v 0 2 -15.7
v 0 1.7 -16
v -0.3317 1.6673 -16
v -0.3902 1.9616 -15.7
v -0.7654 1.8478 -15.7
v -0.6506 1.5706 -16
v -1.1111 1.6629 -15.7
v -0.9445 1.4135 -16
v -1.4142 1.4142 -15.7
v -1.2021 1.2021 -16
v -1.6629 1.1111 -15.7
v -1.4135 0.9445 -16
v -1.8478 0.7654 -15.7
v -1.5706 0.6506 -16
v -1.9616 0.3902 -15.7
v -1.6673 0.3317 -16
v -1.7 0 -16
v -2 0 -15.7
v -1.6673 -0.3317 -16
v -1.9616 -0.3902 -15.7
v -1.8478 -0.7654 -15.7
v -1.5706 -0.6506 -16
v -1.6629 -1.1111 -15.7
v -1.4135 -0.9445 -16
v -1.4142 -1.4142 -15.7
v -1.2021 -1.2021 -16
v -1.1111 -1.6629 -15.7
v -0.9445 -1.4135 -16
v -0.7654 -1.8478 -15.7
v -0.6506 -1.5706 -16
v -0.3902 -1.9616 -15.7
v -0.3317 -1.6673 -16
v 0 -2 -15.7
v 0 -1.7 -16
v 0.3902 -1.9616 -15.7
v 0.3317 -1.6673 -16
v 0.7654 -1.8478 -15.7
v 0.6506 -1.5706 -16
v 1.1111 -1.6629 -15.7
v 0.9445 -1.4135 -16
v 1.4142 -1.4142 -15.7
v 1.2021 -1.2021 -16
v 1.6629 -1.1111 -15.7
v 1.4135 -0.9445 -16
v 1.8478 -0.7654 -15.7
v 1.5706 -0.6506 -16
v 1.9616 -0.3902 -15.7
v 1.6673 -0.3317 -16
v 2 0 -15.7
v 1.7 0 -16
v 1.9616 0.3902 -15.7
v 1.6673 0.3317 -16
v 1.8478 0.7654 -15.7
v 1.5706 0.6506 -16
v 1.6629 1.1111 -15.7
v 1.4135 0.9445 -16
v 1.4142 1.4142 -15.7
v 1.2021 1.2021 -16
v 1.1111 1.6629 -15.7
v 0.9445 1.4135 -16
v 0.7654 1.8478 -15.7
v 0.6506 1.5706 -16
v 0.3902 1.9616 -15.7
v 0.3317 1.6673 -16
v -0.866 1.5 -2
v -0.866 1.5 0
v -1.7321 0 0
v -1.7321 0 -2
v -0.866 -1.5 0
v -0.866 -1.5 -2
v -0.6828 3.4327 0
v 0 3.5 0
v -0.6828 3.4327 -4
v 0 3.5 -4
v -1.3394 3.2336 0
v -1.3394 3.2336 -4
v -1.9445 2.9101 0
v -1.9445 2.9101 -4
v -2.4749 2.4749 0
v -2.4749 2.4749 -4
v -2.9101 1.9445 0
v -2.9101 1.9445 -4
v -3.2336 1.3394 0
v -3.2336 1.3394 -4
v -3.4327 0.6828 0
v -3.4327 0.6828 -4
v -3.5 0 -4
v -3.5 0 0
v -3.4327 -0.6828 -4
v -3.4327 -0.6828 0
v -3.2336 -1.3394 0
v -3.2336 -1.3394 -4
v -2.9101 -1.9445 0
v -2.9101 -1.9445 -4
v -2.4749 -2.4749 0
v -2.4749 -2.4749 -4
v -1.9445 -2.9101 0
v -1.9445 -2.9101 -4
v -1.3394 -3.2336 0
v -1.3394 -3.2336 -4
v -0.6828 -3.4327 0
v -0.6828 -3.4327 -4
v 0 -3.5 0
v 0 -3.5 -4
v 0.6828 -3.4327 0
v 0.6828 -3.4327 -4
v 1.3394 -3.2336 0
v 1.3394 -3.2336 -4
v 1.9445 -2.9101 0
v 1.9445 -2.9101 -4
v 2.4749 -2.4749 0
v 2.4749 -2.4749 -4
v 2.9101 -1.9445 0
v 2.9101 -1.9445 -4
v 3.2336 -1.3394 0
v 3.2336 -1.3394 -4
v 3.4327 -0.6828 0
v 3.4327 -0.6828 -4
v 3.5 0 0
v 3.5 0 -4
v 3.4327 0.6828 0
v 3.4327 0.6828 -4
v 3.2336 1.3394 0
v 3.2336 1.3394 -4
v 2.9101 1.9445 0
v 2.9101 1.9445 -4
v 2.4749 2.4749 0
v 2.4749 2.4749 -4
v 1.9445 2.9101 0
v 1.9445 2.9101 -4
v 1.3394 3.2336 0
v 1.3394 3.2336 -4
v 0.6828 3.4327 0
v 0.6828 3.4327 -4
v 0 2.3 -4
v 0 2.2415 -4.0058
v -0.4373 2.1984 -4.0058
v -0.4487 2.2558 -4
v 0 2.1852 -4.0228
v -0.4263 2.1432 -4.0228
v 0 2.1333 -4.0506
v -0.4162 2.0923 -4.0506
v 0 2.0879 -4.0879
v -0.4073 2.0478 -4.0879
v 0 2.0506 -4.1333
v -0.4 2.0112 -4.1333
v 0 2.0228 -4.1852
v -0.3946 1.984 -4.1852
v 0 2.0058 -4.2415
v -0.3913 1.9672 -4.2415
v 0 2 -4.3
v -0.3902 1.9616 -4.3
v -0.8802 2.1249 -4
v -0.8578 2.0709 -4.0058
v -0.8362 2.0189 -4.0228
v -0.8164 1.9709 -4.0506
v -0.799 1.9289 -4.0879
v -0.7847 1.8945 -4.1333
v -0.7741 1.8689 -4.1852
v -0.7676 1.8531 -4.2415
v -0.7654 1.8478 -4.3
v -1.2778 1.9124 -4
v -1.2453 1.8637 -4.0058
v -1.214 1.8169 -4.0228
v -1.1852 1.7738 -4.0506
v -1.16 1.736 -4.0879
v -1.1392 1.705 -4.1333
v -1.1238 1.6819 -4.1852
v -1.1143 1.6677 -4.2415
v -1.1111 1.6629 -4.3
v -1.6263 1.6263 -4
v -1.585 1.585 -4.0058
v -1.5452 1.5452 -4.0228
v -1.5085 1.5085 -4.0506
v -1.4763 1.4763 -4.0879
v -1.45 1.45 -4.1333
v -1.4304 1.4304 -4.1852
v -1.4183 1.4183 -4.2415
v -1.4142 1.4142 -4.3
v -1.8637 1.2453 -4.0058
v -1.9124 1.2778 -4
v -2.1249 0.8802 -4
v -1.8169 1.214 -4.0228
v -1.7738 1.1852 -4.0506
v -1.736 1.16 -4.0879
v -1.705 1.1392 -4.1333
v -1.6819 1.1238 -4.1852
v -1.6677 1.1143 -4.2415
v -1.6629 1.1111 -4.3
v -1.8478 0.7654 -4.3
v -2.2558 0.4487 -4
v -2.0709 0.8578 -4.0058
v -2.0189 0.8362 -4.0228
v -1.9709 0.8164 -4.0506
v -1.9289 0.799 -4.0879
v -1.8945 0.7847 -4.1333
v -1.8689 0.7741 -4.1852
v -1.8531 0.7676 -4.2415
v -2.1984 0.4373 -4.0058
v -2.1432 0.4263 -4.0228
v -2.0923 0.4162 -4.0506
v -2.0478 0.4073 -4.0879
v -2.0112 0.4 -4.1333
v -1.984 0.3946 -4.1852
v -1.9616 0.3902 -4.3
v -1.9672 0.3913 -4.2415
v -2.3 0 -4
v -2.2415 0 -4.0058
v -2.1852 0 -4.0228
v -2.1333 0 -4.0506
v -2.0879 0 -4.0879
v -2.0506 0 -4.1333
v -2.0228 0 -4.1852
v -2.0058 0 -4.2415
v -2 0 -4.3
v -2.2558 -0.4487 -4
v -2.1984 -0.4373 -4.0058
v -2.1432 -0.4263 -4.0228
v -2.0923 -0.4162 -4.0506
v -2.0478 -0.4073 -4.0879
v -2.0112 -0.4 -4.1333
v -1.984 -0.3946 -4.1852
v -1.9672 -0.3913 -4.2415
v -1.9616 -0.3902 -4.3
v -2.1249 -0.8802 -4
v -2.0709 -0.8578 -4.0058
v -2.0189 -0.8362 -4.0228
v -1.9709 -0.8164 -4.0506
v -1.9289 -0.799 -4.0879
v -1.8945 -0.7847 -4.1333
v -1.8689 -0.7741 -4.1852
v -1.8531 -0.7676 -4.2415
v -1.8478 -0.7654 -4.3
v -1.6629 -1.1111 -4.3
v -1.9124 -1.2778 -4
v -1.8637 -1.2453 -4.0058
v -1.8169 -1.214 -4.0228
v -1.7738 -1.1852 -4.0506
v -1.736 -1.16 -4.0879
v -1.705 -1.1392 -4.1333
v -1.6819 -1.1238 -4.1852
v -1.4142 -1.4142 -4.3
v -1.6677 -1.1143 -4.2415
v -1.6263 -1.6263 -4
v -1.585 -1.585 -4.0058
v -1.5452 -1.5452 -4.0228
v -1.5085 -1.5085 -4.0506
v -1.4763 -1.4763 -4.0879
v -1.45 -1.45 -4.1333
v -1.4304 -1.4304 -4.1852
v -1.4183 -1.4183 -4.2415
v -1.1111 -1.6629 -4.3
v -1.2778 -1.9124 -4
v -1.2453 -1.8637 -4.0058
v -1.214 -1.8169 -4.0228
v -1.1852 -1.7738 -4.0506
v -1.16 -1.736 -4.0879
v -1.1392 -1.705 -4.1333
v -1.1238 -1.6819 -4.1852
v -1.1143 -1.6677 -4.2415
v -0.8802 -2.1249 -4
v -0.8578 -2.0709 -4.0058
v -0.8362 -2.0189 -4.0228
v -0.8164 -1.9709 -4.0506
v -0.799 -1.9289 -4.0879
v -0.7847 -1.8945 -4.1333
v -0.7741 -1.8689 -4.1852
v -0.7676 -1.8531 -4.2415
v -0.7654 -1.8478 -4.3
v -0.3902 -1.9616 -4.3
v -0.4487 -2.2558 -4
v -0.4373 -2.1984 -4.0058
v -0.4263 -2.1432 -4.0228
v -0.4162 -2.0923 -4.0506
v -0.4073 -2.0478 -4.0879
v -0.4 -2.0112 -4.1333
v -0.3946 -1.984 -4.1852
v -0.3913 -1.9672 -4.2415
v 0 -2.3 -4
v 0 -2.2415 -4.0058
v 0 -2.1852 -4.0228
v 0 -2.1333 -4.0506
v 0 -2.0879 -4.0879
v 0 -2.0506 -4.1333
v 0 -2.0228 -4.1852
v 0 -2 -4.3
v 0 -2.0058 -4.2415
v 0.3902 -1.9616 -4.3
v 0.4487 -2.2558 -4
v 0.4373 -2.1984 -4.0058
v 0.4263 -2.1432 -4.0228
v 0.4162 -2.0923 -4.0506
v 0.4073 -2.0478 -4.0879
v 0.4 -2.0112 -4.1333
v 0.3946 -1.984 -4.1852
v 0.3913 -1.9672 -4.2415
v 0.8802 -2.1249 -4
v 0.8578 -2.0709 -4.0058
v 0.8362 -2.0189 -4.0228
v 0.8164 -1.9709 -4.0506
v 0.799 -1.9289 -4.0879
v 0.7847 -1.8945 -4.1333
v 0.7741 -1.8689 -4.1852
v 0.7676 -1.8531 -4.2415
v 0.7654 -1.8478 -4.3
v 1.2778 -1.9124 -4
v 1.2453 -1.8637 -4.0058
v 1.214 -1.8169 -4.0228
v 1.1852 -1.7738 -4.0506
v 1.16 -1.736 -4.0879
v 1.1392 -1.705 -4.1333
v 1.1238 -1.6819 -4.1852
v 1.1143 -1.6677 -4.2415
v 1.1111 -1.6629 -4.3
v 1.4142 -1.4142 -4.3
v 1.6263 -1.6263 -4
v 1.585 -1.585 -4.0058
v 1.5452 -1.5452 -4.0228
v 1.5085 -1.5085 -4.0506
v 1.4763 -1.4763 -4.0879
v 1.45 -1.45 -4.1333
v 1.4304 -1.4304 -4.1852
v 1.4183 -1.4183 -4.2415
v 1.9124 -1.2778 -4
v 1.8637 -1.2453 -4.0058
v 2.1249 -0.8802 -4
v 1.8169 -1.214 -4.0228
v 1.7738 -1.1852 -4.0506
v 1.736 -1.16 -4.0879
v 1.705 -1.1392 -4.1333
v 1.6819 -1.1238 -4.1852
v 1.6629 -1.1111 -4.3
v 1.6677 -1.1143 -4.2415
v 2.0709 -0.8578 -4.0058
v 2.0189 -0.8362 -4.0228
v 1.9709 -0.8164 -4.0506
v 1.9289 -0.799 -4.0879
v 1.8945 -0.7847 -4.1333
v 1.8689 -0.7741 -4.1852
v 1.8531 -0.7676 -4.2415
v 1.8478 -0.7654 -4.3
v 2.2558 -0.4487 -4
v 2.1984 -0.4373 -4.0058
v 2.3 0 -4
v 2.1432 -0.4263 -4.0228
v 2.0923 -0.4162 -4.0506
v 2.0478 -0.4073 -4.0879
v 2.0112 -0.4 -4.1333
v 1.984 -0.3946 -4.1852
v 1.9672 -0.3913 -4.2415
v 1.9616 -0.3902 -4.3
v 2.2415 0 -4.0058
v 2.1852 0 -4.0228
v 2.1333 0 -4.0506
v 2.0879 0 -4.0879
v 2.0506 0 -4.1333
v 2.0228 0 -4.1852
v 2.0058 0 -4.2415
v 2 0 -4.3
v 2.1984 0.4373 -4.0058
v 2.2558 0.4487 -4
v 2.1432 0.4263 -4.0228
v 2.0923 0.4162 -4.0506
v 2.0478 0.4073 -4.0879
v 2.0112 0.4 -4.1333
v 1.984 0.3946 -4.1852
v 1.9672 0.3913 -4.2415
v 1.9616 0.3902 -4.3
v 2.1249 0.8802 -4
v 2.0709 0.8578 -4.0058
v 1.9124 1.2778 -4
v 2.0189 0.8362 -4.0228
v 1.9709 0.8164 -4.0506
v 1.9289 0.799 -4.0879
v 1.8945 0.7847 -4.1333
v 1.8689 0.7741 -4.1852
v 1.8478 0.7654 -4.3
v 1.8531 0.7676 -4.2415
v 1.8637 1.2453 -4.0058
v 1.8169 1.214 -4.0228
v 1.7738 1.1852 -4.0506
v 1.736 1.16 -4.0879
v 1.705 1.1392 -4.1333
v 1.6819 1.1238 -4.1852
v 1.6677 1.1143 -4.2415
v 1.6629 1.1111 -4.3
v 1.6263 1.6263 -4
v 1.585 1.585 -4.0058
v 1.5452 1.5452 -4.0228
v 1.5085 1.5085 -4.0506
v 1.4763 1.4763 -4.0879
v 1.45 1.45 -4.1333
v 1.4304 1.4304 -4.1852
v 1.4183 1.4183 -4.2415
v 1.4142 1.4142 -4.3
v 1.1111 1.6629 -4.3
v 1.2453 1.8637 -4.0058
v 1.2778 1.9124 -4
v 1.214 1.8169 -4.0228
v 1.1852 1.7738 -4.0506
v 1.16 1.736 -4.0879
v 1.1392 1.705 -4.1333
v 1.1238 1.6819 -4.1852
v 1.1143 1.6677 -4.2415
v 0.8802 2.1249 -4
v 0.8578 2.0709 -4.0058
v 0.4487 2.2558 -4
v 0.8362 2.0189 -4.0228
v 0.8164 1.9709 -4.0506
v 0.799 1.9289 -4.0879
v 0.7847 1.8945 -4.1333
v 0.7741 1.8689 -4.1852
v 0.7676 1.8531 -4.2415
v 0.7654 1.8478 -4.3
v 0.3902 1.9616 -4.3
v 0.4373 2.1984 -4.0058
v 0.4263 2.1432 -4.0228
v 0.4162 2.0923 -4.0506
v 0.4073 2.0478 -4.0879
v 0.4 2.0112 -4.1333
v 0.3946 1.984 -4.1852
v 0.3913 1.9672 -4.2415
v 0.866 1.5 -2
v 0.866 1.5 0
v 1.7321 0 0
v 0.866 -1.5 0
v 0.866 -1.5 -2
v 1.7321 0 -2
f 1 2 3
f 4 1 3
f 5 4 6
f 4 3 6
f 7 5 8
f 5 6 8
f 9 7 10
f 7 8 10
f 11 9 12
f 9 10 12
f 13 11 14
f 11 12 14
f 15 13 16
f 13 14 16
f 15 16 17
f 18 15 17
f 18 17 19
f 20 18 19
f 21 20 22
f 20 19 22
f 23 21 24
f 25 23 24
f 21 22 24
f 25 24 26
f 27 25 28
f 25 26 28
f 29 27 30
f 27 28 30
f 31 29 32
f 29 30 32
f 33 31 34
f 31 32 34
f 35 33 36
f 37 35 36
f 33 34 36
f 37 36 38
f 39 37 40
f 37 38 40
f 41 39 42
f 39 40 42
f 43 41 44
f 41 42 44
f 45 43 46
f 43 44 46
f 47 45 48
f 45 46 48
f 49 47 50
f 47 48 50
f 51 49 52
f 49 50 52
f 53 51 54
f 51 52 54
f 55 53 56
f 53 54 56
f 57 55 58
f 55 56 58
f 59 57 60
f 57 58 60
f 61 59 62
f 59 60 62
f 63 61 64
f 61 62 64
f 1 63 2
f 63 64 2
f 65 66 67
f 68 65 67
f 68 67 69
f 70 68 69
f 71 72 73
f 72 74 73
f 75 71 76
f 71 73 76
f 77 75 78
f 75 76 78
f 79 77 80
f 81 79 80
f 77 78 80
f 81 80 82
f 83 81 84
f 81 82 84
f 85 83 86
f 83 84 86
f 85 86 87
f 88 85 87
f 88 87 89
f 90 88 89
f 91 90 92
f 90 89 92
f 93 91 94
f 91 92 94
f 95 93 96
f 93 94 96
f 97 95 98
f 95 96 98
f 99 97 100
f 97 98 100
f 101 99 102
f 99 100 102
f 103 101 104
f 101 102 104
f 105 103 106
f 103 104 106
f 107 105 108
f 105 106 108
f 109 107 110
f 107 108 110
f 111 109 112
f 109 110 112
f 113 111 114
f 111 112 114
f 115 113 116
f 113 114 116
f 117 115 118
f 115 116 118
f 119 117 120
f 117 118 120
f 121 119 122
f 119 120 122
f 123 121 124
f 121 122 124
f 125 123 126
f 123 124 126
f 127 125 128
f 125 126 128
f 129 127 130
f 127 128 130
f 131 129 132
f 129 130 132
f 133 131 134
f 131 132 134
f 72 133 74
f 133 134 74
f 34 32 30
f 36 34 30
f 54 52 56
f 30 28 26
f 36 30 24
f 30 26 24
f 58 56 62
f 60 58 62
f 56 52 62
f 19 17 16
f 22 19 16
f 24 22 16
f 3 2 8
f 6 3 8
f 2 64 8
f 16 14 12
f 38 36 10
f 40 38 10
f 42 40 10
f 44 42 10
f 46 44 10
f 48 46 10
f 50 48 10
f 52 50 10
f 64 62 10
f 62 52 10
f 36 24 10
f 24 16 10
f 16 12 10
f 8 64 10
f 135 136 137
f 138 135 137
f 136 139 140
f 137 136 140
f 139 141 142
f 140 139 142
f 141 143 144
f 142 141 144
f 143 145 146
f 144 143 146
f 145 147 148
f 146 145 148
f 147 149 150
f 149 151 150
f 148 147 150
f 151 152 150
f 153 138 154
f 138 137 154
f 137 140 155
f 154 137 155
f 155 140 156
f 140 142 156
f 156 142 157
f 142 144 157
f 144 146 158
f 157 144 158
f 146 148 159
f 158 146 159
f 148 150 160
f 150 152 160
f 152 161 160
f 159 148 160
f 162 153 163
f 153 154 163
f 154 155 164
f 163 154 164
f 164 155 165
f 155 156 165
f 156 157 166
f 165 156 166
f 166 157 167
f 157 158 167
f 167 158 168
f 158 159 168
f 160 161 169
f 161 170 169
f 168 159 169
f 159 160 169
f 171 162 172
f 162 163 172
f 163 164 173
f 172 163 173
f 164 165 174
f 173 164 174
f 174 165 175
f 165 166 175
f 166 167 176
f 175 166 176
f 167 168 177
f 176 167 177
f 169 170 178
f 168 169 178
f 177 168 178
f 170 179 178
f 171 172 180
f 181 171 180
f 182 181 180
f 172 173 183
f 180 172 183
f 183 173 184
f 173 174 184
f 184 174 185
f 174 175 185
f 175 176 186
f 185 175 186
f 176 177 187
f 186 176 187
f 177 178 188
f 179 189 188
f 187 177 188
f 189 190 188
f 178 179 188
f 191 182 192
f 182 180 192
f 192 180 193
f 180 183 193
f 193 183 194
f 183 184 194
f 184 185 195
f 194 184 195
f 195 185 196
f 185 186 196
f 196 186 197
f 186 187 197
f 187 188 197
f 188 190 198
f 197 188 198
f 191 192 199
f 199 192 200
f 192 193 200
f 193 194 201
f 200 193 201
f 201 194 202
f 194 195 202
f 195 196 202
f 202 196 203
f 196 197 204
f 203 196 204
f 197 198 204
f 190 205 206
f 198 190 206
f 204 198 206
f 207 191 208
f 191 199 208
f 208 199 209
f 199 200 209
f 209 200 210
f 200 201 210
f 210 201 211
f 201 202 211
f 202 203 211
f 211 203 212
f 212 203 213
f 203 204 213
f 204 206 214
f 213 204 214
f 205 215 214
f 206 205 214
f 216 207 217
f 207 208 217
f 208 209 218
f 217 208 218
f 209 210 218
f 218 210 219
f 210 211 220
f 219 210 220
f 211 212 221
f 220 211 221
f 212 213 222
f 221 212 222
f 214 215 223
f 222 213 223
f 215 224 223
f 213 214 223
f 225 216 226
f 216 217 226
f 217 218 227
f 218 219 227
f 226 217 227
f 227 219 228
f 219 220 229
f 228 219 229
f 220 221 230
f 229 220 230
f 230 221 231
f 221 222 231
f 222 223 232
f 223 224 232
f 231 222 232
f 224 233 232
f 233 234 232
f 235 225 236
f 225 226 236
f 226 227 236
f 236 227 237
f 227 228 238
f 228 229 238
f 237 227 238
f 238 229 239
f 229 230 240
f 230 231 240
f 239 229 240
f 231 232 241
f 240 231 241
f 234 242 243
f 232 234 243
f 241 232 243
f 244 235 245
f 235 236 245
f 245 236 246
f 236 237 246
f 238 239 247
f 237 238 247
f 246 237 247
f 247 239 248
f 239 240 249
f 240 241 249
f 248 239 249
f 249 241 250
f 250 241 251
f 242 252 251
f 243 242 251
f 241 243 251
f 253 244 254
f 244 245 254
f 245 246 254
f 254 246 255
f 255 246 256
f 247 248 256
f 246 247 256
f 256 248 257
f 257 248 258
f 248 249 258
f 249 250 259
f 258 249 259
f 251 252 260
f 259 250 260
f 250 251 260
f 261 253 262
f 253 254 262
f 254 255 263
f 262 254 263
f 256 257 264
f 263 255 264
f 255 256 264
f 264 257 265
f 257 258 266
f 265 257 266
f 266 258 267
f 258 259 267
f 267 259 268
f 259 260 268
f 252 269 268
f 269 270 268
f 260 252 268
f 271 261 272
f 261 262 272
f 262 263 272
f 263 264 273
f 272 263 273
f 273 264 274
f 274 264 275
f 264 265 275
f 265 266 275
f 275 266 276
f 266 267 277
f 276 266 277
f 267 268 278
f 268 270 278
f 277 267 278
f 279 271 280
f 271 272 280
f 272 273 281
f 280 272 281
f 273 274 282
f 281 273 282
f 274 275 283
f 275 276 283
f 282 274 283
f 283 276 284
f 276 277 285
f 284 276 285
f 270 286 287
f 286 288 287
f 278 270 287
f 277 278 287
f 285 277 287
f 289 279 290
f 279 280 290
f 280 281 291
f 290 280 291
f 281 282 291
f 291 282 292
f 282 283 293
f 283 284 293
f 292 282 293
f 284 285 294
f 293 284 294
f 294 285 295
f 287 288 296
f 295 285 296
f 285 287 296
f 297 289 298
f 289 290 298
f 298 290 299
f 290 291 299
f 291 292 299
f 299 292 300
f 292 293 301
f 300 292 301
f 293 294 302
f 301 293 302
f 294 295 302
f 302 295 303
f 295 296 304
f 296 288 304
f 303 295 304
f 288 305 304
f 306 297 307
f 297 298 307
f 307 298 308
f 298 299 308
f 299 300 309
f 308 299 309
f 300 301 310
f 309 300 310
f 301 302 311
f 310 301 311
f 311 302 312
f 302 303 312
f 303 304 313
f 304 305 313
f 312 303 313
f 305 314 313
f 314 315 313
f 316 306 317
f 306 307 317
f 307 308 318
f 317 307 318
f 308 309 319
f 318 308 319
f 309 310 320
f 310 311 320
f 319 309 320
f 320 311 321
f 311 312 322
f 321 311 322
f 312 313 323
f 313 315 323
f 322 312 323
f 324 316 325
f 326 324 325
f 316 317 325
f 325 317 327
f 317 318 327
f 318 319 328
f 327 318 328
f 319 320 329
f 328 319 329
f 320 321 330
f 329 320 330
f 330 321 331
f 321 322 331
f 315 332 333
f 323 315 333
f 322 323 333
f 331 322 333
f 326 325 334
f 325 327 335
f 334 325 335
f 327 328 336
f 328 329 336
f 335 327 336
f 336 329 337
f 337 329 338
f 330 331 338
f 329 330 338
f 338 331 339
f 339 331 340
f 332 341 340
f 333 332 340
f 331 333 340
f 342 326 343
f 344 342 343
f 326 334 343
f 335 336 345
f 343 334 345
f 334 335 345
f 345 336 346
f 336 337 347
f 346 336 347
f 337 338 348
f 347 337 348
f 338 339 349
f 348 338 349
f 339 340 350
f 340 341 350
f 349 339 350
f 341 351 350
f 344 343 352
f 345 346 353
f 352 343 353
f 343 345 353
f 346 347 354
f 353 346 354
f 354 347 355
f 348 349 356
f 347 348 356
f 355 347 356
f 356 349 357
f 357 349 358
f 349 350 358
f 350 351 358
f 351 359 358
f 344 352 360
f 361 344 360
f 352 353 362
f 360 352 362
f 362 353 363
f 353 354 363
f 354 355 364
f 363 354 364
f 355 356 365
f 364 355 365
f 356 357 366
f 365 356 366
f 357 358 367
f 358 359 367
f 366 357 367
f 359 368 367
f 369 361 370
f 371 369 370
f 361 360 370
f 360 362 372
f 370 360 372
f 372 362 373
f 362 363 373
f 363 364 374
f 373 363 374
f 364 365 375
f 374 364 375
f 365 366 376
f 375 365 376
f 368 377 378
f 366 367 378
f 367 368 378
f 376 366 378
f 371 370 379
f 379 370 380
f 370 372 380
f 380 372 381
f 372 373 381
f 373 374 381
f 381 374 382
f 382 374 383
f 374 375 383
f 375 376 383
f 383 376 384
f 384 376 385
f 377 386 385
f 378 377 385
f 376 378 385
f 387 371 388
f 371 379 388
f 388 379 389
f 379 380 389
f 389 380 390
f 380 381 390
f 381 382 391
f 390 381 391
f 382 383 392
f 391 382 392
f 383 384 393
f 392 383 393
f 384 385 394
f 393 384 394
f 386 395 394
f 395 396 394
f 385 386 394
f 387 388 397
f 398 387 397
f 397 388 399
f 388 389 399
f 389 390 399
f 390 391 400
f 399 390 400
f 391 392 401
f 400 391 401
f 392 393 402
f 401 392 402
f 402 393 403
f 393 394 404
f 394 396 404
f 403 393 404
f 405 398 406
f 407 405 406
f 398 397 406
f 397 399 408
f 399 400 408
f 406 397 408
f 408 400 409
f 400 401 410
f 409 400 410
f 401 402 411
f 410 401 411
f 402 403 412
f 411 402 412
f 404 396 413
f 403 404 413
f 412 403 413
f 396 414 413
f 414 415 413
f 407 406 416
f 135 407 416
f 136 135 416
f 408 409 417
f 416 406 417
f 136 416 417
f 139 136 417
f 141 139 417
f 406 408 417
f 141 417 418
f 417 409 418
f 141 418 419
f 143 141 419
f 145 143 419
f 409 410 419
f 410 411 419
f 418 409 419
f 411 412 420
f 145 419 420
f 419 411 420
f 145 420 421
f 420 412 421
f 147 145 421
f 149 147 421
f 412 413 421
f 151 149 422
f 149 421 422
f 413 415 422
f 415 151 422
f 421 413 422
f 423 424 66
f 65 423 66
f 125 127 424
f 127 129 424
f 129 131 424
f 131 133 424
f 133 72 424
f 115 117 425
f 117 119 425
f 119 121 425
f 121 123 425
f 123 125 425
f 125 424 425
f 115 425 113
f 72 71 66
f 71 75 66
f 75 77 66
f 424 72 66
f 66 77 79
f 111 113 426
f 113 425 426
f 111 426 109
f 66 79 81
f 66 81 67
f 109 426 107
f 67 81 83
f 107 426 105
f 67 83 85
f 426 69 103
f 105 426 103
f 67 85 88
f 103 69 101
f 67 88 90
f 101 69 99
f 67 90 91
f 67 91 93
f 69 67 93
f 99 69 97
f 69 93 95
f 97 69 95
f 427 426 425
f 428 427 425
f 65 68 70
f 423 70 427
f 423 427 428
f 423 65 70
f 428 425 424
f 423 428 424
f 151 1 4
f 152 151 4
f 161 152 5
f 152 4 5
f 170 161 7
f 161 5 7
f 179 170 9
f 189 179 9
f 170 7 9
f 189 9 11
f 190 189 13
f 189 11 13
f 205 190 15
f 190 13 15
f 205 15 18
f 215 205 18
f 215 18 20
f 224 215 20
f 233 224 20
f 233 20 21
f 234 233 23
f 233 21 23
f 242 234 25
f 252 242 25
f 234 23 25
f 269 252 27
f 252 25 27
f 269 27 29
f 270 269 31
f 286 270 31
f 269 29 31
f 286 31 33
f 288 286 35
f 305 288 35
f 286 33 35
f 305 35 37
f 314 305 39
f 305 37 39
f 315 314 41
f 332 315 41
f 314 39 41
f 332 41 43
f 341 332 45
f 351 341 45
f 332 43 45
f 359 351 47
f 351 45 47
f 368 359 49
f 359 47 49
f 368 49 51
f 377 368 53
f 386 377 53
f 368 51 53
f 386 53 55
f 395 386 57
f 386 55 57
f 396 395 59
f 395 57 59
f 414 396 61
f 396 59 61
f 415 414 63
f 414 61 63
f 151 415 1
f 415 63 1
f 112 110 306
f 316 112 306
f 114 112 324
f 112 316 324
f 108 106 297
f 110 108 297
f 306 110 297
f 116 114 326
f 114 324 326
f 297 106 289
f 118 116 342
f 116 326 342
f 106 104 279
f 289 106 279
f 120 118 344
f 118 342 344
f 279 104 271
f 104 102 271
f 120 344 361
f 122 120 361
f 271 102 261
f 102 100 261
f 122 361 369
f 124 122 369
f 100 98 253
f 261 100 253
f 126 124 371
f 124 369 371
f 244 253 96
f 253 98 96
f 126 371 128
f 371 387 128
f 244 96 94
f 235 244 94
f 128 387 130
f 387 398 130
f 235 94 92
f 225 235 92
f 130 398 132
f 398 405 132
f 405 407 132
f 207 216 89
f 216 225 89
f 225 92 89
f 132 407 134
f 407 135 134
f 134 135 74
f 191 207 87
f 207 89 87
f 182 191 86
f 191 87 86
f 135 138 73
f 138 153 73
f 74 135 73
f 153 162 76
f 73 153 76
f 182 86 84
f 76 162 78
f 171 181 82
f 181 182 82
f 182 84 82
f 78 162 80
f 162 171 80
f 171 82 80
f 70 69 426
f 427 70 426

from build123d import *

# Parameters (mm, degrees)
CUT_EXTRUDE_1_DEPTH = 2
FILLET_1_R          = 0.3
CHAMFER_1_SIZE      = 0.3


with BuildPart() as part:
    # Эскиз1 → Повернуть1 (revolve)
    with BuildSketch(Plane(origin=(0, 0, 0), x_dir=(0, 0, -1), z_dir=(1, 0, 0))):
        Polygon((0, 0), (0, 3.5), (4, 3.5), (4, 2), (16, 2), (16, 0), align=None)
    revolve(axis=Axis((0, 0, 0), (0, 0, 1)))

    # Эскиз2 → Вырез-Вытянуть1 (cut)
    with BuildSketch(Plane.XY):
        Polygon((1.732050808, 0), (0.866025404, 1.5), (-0.866025404, 1.5), (-1.732050808, 0), (-0.866025404, -1.5), (0.866025404, -1.5), align=None)
    extrude(amount=-CUT_EXTRUDE_1_DEPTH, mode=Mode.SUBTRACT)

    # Скругление1
    fillet_1_edges = [part.edges().sort_by_distance(p)[0] for p in [
        (0, -2, -4),
    ]]
    fillet(fillet_1_edges, radius=FILLET_1_R)

    # Фаска1
    chamfer_1_edges = [part.edges().sort_by_distance(p)[0] for p in [
        (0, -2, -16),
    ]]
    chamfer(chamfer_1_edges, length=CHAMFER_1_SIZE)


solid = part.part
